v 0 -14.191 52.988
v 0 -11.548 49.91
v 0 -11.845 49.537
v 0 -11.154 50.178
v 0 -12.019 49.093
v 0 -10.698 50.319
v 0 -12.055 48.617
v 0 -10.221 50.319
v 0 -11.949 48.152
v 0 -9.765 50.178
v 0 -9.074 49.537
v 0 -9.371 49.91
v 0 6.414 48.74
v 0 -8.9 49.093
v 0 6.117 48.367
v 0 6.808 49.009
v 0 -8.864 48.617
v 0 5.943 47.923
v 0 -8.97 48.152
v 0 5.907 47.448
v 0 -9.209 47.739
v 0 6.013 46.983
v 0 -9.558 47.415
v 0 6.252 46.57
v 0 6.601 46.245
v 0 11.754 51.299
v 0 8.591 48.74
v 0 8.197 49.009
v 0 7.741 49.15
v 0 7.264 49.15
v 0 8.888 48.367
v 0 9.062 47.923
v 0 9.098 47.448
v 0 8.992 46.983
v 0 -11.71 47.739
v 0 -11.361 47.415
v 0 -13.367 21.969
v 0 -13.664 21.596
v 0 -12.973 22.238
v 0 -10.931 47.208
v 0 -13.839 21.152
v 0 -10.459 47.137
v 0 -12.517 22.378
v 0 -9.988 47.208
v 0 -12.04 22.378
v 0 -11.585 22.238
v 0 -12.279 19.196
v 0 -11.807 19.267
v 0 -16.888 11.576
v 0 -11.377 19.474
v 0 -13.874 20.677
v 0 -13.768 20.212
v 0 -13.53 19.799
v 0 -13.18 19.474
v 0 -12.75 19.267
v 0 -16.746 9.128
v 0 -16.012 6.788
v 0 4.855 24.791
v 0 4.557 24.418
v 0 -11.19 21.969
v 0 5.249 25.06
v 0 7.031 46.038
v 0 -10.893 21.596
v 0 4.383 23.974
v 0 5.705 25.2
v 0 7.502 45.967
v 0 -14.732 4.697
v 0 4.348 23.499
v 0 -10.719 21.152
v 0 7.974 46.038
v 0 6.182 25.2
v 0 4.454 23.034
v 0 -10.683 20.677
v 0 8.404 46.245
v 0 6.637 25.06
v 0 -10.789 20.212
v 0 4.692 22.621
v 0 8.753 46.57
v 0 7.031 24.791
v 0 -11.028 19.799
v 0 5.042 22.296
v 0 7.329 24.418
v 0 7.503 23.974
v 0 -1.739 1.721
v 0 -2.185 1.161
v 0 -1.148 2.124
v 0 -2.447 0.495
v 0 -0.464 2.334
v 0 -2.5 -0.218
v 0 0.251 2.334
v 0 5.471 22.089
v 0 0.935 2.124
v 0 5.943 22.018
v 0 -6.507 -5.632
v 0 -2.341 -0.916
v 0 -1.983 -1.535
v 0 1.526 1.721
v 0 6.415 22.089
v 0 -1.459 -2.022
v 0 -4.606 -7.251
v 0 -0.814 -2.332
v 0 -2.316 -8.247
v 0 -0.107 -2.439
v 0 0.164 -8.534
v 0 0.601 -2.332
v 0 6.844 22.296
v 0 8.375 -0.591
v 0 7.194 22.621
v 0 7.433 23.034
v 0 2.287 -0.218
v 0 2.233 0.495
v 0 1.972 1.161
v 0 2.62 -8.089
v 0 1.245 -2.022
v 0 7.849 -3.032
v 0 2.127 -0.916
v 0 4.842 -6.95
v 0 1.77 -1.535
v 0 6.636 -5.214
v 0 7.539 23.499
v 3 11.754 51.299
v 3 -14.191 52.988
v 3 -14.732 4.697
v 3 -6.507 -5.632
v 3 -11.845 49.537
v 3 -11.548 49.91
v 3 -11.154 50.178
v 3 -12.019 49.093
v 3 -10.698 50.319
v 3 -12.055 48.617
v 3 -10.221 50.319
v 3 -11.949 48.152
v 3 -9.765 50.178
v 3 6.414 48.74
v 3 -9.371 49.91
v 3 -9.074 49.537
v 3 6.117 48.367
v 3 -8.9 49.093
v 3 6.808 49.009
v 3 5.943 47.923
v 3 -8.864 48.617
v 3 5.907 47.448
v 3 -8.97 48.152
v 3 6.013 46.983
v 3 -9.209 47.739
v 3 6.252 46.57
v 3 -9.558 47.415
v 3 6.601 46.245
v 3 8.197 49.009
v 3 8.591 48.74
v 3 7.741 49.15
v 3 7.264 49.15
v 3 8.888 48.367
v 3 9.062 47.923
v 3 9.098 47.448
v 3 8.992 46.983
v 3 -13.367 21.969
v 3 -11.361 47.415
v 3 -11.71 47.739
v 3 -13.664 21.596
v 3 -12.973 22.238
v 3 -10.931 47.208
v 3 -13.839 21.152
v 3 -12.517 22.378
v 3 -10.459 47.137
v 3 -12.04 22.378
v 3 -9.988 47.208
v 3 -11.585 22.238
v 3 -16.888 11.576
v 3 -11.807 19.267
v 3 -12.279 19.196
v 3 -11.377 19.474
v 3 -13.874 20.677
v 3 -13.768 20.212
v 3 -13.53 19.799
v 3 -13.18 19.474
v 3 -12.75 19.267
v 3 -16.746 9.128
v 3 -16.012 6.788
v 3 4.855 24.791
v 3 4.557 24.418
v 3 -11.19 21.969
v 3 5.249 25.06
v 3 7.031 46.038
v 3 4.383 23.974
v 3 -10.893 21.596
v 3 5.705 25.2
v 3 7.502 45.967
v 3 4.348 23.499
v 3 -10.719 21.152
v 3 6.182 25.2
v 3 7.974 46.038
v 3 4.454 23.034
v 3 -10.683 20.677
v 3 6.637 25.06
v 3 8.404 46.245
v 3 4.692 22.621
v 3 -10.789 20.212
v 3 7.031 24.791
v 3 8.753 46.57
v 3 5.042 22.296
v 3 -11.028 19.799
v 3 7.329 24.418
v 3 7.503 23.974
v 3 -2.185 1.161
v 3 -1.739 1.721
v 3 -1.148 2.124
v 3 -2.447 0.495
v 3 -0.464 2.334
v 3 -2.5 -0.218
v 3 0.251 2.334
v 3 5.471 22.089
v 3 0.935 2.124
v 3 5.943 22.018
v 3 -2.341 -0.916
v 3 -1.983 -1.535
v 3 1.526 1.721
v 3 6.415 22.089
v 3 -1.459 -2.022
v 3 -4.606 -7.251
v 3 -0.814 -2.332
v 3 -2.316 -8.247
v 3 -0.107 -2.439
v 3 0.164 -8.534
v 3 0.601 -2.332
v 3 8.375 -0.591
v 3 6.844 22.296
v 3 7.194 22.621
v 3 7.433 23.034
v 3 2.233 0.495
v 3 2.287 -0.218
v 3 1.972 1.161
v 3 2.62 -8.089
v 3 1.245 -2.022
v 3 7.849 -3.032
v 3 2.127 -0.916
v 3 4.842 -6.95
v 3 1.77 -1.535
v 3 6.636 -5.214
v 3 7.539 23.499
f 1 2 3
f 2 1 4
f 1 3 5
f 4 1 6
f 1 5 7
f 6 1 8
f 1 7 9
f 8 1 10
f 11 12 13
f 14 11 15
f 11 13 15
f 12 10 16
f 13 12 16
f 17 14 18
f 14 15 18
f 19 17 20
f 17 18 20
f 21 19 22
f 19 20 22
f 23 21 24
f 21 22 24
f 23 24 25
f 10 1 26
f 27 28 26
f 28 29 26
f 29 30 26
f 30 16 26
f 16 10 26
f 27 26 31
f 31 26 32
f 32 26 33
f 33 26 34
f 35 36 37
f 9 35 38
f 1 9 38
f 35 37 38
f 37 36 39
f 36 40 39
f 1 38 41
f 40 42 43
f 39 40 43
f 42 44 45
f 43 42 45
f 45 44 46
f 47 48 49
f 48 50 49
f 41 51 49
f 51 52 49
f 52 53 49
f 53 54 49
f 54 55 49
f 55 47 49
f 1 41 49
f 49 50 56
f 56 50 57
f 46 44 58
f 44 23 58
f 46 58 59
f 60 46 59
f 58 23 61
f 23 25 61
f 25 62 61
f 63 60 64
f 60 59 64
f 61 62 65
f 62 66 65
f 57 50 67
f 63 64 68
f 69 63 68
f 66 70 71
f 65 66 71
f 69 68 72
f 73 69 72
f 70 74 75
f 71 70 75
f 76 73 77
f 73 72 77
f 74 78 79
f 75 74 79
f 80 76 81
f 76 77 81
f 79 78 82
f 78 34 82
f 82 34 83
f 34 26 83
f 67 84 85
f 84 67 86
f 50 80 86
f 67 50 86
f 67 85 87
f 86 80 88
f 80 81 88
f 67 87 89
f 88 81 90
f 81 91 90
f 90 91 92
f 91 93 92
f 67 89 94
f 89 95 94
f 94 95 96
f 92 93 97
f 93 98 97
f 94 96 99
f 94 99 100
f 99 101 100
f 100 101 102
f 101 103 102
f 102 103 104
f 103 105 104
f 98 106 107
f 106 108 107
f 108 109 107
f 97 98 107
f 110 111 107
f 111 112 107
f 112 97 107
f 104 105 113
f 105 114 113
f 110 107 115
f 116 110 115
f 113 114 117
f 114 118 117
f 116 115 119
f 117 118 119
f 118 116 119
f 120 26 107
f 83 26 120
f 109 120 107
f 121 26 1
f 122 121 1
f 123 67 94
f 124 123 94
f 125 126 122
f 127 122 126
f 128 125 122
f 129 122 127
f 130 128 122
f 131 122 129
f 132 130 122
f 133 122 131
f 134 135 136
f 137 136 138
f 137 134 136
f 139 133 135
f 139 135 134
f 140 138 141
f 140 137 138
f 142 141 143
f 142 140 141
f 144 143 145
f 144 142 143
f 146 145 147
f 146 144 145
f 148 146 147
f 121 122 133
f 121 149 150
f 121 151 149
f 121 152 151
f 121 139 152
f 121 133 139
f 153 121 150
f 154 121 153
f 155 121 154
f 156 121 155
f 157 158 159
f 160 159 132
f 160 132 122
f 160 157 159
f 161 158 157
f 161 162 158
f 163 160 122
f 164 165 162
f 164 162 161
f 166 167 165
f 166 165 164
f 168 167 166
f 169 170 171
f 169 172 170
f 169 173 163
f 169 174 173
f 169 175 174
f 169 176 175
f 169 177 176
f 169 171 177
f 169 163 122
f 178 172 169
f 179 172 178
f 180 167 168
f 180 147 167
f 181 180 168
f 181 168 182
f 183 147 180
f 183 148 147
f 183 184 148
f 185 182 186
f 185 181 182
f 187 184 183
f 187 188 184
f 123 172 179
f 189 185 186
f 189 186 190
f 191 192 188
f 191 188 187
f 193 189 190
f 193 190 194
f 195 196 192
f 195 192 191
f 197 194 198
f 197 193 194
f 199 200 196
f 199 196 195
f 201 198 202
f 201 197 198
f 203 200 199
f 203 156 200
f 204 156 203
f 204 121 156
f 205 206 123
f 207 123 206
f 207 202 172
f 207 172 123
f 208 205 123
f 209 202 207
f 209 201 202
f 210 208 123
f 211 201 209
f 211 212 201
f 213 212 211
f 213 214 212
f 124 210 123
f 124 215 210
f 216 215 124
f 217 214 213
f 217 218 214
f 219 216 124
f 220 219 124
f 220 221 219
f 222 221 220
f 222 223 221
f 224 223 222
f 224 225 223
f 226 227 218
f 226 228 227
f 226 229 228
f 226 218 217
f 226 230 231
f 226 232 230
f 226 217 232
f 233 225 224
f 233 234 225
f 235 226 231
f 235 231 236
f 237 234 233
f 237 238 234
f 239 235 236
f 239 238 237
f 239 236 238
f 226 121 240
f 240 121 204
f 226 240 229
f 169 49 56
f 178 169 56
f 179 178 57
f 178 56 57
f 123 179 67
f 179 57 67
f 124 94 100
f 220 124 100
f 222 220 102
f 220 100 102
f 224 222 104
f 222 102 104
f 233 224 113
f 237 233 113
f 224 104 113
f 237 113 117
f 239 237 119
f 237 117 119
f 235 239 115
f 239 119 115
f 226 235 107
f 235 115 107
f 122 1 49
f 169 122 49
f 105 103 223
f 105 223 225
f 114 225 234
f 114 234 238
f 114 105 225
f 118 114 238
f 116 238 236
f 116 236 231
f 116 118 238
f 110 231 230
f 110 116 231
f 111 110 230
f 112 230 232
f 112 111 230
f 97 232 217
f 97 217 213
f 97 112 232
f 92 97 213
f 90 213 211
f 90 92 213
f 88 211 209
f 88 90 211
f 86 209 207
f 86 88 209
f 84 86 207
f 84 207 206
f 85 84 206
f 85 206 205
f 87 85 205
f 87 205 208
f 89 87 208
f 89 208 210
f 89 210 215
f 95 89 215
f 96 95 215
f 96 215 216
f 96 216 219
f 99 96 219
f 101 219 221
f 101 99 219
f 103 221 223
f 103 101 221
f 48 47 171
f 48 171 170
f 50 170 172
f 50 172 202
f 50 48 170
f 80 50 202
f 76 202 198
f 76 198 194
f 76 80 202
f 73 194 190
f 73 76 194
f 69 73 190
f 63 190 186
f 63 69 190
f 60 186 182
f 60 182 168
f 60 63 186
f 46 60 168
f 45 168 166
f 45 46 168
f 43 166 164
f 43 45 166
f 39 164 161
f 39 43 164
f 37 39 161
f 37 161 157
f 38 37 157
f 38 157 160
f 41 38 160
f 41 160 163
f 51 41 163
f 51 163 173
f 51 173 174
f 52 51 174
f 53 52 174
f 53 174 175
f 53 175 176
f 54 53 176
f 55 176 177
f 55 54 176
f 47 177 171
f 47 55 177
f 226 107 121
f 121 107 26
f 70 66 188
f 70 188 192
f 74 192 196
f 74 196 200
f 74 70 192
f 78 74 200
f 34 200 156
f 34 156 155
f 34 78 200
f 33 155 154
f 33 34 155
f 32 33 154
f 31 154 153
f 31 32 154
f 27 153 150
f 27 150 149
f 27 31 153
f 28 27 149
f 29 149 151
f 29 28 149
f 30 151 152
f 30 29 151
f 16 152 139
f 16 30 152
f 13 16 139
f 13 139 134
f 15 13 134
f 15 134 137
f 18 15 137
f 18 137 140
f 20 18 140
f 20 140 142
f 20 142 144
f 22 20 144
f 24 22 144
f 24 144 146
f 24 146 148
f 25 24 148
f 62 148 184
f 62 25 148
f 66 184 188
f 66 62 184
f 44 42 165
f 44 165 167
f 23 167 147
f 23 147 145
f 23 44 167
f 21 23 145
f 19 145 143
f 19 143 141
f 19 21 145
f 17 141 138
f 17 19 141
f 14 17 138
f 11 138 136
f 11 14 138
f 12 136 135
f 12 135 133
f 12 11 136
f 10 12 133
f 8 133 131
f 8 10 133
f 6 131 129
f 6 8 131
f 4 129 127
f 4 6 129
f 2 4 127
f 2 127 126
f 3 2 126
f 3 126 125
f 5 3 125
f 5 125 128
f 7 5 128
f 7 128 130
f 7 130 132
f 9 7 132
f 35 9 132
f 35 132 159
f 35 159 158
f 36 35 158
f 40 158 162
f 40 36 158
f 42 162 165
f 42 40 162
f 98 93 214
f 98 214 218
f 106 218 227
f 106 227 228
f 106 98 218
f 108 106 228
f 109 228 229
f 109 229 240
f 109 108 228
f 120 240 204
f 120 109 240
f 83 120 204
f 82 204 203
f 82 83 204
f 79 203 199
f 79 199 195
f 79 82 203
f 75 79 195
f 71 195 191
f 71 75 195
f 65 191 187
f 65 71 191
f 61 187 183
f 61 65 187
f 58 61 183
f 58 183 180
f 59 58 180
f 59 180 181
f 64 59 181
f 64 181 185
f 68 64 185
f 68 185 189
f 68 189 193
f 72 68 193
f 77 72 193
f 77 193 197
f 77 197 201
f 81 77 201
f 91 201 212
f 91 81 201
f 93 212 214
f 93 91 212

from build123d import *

# Parameters (mm, degrees)
SKETCH_1_R      = 2.4
SKETCH_1_R_2    = 1.6
EXTRUDE_1_DEPTH = 3


with BuildPart() as part:
    # 草图1 → 凸台-拉伸1 (new body)
    with BuildSketch(Plane(origin=(0, 0, 0), x_dir=(0, 0, -1), z_dir=(1, 0, 0))):
        with BuildLine():
            Line((-52.988376737, -14.191142444), (-11.576067608, -16.887557214))
            ThreePointArc((-11.576067608, -16.887557214), (-7.935716472, -16.451026673), (-4.697384878, -14.73174665))
            Line((-4.697384878, -14.73174665), (5.632436087, -6.506846665))
            ThreePointArc((5.632436087, -6.506846665), (8.08940986, 2.62041481), (0.591065641, 8.375278503))
            Line((0.591065641, 8.375278503), (-51.299056641, 11.753918697))
            Line((-51.299056641, 11.753918697), (-52.988376737, -14.191142444))
        make_face()
        with Locations((0.038787918, -0.106760716)):
            Circle(SKETCH_1_R, mode=Mode.SUBTRACT)
        with Locations((-47.567404172, 7.502475429)):
            Circle(SKETCH_1_R_2, mode=Mode.SUBTRACT)
        with Locations((-20.796098395, -12.278757773)):
            Circle(SKETCH_1_R_2, mode=Mode.SUBTRACT)
        with Locations((-23.618116965, 5.943103032)):
            Circle(SKETCH_1_R_2, mode=Mode.SUBTRACT)
        with Locations((-48.73693347, -10.459489976)):
            Circle(SKETCH_1_R_2, mode=Mode.SUBTRACT)
    extrude(amount=EXTRUDE_1_DEPTH)


solid = part.part
